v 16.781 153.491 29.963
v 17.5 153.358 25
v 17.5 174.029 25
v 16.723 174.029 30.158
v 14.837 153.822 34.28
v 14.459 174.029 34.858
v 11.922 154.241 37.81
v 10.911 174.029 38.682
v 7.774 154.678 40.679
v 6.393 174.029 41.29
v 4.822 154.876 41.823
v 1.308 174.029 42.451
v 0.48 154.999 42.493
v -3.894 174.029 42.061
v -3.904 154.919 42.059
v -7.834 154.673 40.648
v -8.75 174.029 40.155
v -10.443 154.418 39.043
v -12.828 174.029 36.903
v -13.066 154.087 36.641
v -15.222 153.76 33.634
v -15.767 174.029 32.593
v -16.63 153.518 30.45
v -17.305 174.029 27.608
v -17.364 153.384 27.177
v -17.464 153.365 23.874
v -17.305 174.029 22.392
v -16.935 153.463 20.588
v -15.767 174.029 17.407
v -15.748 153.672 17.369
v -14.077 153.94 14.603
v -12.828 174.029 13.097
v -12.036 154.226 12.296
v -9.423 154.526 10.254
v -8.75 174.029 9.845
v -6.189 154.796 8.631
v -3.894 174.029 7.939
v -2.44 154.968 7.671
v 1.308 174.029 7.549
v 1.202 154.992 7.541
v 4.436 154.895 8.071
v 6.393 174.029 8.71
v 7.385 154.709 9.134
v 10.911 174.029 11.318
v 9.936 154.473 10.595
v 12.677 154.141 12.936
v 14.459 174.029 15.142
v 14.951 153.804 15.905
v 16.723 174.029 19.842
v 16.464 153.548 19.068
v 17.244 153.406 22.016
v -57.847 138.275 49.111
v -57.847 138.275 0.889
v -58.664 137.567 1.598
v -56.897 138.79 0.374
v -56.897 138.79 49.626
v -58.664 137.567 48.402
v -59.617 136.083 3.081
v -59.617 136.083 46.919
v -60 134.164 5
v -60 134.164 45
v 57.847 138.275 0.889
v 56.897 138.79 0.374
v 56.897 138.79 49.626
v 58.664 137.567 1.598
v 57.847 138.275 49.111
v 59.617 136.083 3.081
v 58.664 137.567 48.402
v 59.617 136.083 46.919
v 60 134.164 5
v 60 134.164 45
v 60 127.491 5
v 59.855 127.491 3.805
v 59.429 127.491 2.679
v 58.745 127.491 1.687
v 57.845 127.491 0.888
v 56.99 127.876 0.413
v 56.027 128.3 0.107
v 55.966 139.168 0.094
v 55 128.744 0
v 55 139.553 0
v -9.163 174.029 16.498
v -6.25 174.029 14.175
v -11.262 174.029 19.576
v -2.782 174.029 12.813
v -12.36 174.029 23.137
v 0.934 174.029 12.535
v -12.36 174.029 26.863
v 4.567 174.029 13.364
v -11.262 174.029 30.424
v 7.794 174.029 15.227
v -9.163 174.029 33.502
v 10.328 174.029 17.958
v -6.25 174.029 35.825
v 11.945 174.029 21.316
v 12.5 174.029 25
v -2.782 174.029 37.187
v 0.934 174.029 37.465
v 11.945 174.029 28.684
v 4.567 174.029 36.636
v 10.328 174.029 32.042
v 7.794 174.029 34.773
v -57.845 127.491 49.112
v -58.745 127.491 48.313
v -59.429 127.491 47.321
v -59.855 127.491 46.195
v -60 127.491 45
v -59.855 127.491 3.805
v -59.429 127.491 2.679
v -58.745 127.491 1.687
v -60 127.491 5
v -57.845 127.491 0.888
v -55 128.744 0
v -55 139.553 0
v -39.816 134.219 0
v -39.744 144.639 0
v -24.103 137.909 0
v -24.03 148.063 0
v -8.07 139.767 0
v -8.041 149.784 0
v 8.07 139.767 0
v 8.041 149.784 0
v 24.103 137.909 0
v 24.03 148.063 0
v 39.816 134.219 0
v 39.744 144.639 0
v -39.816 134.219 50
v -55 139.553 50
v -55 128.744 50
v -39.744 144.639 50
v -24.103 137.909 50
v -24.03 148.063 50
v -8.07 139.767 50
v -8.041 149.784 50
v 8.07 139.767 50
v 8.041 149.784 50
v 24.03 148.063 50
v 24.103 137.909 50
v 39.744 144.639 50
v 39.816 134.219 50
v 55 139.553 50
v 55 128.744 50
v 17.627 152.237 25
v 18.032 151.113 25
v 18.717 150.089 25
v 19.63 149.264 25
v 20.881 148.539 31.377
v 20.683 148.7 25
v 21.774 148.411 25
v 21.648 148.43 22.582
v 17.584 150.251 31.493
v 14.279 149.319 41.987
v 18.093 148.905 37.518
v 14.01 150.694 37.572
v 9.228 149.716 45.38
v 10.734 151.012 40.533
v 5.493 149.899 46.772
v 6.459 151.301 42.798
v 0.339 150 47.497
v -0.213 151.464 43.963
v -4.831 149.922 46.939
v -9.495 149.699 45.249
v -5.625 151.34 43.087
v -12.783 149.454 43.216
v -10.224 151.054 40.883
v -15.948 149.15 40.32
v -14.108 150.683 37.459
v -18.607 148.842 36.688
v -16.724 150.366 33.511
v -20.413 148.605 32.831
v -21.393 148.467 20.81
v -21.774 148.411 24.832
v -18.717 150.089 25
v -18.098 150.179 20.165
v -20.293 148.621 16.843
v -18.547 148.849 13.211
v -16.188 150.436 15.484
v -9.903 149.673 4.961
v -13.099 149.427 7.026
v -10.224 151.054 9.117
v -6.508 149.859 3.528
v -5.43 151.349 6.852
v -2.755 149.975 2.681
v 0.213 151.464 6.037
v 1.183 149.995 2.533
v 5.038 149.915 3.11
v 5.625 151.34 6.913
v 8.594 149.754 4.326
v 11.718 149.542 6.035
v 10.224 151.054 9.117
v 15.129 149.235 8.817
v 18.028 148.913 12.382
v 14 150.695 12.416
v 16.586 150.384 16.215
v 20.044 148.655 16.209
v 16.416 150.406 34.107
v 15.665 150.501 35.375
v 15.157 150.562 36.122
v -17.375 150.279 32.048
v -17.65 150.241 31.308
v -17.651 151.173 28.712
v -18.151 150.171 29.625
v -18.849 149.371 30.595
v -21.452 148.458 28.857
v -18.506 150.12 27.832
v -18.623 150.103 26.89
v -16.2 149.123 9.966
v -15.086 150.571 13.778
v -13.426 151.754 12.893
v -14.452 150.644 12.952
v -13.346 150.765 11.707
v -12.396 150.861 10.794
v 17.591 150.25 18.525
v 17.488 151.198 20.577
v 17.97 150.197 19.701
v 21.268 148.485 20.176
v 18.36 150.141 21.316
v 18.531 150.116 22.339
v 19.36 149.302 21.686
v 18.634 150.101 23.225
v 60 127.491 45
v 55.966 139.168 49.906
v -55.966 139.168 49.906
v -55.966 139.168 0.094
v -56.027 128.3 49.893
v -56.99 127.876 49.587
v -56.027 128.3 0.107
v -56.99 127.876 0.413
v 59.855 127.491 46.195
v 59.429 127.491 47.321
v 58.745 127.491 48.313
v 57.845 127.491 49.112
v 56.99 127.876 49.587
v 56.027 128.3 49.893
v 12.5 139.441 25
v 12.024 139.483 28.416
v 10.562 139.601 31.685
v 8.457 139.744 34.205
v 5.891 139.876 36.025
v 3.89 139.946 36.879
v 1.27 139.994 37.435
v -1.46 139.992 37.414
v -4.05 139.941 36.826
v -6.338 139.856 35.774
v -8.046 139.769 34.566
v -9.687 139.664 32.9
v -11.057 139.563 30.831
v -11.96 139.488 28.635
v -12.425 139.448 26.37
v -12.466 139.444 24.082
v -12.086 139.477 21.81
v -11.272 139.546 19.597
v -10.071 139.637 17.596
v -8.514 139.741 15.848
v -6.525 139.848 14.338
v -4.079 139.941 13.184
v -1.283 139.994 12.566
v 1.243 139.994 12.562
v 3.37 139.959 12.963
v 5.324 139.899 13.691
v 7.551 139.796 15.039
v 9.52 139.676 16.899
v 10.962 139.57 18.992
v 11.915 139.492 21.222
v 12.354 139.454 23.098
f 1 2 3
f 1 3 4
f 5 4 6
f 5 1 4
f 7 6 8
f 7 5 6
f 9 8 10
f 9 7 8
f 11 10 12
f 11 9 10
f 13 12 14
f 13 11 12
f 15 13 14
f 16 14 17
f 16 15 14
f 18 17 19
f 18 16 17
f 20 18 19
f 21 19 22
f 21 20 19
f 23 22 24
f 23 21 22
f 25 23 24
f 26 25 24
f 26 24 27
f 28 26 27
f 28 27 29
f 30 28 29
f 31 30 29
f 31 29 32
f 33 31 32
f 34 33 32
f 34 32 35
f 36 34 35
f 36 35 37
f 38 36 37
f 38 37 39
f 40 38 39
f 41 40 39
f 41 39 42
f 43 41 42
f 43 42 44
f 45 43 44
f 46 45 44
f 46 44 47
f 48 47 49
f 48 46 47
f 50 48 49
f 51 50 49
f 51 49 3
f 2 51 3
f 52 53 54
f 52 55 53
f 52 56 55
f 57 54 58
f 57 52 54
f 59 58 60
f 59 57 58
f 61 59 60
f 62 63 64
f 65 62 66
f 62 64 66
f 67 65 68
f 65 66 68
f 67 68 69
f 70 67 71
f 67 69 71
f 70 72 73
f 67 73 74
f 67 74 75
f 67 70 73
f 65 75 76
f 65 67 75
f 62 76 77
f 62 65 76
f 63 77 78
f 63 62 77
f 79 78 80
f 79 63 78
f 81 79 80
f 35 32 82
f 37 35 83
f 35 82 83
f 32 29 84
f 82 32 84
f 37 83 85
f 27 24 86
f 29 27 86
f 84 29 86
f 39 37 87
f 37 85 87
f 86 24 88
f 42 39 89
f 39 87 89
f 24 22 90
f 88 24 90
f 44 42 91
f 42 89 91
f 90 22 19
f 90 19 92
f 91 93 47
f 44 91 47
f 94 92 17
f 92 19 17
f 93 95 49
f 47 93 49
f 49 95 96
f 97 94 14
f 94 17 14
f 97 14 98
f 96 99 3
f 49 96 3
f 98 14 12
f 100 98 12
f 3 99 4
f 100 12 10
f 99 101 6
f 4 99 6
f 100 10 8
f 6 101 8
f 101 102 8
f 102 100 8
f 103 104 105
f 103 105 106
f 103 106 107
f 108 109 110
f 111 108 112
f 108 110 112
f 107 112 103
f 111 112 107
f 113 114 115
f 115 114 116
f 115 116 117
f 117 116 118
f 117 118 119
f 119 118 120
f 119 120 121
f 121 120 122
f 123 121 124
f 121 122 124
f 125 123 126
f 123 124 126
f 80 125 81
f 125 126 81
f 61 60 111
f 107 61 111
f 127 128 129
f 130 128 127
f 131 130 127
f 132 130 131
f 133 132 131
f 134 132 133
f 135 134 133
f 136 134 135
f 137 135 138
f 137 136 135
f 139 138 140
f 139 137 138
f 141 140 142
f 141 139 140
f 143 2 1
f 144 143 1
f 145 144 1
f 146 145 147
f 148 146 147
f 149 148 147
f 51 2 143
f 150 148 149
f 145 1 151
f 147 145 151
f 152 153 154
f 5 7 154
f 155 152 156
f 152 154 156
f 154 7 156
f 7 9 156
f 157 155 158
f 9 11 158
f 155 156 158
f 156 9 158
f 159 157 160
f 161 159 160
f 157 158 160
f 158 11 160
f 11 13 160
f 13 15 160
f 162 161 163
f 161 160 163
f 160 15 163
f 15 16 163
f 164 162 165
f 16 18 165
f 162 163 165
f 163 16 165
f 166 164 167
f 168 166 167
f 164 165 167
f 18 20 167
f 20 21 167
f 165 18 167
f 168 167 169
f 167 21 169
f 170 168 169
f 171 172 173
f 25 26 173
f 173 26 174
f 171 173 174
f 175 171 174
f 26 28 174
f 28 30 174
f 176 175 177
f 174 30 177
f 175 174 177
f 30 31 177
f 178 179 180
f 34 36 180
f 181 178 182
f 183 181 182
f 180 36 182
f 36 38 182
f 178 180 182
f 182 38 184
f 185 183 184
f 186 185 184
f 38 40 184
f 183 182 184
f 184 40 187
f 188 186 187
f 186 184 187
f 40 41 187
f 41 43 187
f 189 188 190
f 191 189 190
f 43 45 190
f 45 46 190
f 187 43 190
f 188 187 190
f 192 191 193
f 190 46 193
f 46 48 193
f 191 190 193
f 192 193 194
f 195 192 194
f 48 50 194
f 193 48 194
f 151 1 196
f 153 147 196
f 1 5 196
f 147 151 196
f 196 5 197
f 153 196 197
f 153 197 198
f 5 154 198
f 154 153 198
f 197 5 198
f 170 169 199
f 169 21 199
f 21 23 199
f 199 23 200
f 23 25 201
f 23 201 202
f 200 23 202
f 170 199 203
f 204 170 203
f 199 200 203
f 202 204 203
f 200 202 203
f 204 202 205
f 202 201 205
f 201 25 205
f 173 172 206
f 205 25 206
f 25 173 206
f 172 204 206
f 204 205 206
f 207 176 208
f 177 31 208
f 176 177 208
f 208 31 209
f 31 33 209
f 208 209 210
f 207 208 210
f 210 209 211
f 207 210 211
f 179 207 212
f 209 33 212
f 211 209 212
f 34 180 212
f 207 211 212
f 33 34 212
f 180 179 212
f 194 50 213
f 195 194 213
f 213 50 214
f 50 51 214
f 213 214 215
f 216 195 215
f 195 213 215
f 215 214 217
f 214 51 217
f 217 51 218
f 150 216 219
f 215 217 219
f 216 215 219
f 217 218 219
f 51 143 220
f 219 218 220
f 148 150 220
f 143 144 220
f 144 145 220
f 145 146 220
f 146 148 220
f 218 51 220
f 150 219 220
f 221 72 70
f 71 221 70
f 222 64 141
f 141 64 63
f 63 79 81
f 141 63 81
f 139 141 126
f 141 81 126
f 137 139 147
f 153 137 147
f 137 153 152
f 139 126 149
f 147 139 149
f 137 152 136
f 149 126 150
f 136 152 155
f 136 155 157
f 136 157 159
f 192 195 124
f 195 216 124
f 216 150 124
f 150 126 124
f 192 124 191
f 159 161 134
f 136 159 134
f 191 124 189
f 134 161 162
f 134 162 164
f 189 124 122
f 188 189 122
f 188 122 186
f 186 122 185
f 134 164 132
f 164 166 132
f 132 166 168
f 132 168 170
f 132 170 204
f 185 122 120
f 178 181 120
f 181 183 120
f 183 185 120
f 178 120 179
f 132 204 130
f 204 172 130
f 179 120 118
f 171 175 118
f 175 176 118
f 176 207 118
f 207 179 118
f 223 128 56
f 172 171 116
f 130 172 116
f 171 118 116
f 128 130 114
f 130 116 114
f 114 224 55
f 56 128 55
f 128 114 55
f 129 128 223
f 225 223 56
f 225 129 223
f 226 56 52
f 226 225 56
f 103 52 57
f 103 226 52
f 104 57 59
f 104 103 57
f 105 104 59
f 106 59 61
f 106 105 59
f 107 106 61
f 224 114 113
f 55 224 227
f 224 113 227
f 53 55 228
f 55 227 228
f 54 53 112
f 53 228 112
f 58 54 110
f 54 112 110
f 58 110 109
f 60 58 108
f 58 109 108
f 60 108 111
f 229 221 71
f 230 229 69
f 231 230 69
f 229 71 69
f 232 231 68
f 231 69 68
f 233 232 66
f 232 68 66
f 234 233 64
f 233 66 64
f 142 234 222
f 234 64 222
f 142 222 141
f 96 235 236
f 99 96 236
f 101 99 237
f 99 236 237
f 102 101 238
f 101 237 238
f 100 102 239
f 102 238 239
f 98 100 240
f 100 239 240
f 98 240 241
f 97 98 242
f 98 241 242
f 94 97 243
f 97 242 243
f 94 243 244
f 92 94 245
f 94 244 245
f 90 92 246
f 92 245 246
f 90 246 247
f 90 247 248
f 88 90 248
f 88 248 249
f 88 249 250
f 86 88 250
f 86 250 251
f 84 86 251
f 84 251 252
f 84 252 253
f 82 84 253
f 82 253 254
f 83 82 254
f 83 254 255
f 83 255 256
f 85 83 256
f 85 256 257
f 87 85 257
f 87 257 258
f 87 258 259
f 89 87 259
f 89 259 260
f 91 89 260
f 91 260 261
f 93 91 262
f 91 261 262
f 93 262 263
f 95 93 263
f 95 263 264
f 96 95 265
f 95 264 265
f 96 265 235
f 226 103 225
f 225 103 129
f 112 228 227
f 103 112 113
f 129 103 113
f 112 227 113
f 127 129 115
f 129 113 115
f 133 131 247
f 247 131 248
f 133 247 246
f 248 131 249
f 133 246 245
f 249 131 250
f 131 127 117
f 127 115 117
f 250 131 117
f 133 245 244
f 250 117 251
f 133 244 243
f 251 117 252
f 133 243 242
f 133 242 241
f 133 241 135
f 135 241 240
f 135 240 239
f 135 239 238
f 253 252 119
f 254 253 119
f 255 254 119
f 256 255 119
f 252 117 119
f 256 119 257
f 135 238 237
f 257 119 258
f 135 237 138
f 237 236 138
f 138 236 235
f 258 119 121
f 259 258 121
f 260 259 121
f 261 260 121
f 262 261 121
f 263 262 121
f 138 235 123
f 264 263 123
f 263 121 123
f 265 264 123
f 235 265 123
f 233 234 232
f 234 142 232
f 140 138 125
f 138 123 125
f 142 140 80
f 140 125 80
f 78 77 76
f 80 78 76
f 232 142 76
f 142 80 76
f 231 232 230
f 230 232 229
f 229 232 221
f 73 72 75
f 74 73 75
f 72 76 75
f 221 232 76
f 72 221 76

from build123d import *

# Parameters (mm, degrees)
F1_DEPTH = 50
F3_START = -144.7303891182
F2_R     = 17.5
F3_DEPTH = 29.2989462614
F4_R     = 5
F6_D     = 25
F7_R     = 5


with BuildPart() as f1:
    # F0 (on Top) → F1 (new body)
    with BuildSketch(Plane.XY):
        with BuildLine():
            ThreePointArc((-57.8447732054, 127.4911064067), (0, 140), (57.8447732054, 127.4911064067))
            Line((57.8447732054, 127.4911064067), (60, 127.4911064067))
            Line((60, 127.4911064067), (60, 137.4772708487))
            ThreePointArc((60, 137.4772708487), (0, 150), (-60, 137.4772708487))
            Line((-60, 137.4772708487), (-60, 127.4911064067))
            Line((-60, 127.4911064067), (-57.8447732054, 127.4911064067))
        make_face()
    extrude(amount=F1_DEPTH)

    # F2 (on Front) → F3 (join)
    with BuildSketch(Plane.XZ.offset(F3_START)):
        with Locations((0, 25)):
            Circle(F2_R)
    extrude(amount=-F3_DEPTH)

    # F4
    f4_edges = [f1.edges().sort_by_distance(p)[0] for p in [
        (-17.5, 148.975669, 25),
    ]]
    fillet(f4_edges, radius=F4_R)

    # F6 (through all)
    with Locations(Plane(origin=(0, 174.0293353796, 0), x_dir=(-1, 0, 0), z_dir=(0, 1, 0))):
        with Locations((0, 25)):
            Hole(F6_D / 2)

    # F7
    f7_edges = [f1.edges().sort_by_distance(p)[0] for p in [
        (-60, 132.484189, 50),
        (-60, 137.477271, 25),
        (-60, 132.484189, 0),
        (60, 132.484189, 50),
        (60, 137.477271, 25),
        (60, 132.484189, 0),
    ]]
    fillet(f7_edges, radius=F7_R)


solid = f1.part
